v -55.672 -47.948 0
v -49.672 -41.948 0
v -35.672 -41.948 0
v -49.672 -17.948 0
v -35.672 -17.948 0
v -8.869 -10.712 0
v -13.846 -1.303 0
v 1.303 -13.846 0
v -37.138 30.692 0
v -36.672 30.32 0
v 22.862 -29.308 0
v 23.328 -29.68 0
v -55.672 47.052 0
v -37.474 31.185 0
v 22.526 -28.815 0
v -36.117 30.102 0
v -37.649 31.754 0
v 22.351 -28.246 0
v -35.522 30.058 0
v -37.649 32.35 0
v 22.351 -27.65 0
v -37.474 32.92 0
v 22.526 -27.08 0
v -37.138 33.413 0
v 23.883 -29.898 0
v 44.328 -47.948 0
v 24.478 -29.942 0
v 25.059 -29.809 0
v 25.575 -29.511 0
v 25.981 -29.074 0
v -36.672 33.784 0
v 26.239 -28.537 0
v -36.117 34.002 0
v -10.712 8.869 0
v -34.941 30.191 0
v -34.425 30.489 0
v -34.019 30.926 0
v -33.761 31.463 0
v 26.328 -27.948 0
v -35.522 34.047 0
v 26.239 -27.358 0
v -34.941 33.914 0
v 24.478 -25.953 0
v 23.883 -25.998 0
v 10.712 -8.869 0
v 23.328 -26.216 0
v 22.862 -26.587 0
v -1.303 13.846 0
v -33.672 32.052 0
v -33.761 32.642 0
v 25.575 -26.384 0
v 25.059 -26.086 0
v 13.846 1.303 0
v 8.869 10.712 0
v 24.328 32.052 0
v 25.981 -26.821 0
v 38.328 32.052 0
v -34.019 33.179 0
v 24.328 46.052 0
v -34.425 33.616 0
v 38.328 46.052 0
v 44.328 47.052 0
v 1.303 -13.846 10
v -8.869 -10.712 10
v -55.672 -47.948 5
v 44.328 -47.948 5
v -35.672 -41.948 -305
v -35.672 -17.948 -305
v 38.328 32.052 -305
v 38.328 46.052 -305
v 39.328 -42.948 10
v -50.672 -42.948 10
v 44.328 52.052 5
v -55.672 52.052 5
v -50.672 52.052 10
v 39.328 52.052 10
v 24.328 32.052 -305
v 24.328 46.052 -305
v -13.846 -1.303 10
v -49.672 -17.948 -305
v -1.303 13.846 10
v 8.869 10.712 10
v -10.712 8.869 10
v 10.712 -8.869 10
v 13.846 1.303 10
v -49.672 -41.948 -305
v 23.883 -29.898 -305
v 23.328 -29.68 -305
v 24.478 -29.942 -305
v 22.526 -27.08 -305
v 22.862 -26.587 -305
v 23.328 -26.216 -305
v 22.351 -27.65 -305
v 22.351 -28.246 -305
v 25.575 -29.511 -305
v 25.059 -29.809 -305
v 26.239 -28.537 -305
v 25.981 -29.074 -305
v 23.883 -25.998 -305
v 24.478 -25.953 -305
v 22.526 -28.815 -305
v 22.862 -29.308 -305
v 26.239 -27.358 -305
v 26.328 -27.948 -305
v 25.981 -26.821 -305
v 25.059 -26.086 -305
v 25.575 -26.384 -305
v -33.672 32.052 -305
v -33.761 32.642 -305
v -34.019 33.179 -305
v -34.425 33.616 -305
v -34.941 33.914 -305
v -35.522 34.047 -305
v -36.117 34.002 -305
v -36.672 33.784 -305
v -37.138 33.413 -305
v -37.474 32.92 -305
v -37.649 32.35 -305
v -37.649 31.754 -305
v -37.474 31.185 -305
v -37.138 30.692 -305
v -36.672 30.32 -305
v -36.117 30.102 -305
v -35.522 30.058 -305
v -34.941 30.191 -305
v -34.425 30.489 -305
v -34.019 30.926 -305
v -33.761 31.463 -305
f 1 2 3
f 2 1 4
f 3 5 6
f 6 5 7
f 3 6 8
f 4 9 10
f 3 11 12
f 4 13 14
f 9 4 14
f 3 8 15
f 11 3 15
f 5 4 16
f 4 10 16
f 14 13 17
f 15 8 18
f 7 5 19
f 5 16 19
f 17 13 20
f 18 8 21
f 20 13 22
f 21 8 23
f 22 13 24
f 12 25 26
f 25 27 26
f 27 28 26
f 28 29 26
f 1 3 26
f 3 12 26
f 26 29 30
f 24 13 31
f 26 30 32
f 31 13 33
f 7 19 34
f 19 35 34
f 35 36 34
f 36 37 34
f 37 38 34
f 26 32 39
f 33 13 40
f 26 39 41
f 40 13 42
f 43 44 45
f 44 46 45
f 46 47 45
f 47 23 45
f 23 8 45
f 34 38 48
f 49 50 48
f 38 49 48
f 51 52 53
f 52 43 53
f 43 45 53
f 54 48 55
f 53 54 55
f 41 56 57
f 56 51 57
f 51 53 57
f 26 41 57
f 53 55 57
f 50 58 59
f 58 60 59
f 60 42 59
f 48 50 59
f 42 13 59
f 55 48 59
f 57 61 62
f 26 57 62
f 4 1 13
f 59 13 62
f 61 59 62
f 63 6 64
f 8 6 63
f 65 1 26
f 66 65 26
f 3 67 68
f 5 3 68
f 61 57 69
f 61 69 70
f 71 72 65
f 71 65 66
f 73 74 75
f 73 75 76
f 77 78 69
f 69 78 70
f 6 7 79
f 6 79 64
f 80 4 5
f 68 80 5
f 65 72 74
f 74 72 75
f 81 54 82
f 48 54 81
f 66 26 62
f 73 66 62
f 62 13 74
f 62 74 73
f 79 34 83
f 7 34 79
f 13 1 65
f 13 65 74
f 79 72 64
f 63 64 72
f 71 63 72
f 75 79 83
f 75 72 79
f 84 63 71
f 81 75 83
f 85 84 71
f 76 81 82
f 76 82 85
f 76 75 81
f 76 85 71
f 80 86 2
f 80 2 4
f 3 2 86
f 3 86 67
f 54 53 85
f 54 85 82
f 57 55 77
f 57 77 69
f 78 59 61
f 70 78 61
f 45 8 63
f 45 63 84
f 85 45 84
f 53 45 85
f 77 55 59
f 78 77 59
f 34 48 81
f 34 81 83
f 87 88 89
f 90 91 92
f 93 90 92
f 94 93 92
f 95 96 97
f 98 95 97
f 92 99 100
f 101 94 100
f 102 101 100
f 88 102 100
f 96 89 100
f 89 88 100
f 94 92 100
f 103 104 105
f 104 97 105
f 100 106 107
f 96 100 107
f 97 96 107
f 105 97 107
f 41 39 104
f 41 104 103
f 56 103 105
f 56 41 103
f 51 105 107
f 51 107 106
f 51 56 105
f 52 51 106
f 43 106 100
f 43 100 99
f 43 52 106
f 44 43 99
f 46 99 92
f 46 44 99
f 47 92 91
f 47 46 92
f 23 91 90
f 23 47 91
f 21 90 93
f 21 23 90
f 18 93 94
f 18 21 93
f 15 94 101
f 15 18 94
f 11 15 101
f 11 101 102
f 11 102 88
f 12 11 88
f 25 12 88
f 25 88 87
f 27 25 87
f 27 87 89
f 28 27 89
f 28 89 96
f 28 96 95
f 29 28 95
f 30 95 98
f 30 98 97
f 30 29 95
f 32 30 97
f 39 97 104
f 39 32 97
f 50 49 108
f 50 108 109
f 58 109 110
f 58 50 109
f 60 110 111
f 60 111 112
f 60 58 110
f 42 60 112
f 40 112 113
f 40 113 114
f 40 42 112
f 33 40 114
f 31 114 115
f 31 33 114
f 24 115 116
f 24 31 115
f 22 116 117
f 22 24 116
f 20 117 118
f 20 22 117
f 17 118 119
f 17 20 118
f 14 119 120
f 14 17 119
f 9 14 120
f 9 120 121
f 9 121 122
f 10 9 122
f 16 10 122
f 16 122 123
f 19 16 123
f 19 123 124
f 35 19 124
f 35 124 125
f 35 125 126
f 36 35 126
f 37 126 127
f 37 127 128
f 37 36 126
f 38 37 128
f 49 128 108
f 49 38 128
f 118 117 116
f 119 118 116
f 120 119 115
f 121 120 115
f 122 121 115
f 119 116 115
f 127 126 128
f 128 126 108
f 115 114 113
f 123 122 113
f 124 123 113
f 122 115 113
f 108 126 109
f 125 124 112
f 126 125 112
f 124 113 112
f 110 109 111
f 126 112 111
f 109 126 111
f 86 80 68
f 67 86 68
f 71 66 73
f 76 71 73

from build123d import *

# Parameters (mm, degrees)
F0_W     = 100
F0_H     = 100
F1_DEPTH = 10
F3_DEPTH = 28
F4_R     = 2
F5_DEPTH = 305
F6_R     = 2
F7_DEPTH = 305
F8_W     = 14
F8_H     = 24
F8_H_2   = 14
F9_DEPTH = 305
F10_SIZE = 4.99999


# Not quite as in the source:
# - a fillet or chamfer is up to 0.001 mm smaller than in the source, because OpenCascade refuses the exact size


with BuildPart() as f1:
    # F0 (on Top) → F1 (new body)
    with BuildSketch(Plane.XY):
        with Locations((-5.6718036532, 2.052295208)):
            Rectangle(F0_W, F0_H)
    extrude(amount=F1_DEPTH)

    # F2 (on Top) → F3 (cut)
    with BuildSketch(Plane.XY):
        Polygon((-8.8692104674, -10.7118982853), (1.3029770516, -13.8459347822), (10.7118982853, -8.8692104674), (13.8459347822, 1.3029770516), (8.8692104674, 10.7118982853), (-1.3029770516, 13.8459347822), (-10.7118982853, 8.8692104674), (-13.8459347822, -1.3029770516), align=None)
    extrude(amount=F3_DEPTH, mode=Mode.SUBTRACT)

    # F4 (on Top) → F5 (join)
    with BuildSketch(Plane.XY):
        with Locations((24.3281963468, -27.947704792)):
            Circle(F4_R)
    extrude(amount=-F5_DEPTH)

    # F6 (on Top) → F7 (join)
    with BuildSketch(Plane.XY):
        with Locations((-35.6718036532, 32.052295208)):
            Circle(F6_R)
    extrude(amount=-F7_DEPTH)

    # F8 (on Top) → F9 (join)
    with BuildSketch(Plane.XY):
        with Locations((-42.6718036532, -29.947704792)):
            Rectangle(F8_W, F8_H)
        with Locations((31.3281963468, 39.052295208)):
            Rectangle(F8_W, F8_H_2)
    extrude(amount=-F9_DEPTH)

    # F10 (size 5 in the source; OpenCascade refuses exactly that, so slightly less here)
    f10_edges = [f1.edges().sort_by_distance(p)[0] for p in [
        (-55.671804, 2.052295, 10),
        (-5.671804, -47.947705, 10),
        (-5.671804, 52.052295, 0),
        (44.328196, 2.052295, 10),
    ]]
    chamfer(f10_edges, length=F10_SIZE)


solid = f1.part
